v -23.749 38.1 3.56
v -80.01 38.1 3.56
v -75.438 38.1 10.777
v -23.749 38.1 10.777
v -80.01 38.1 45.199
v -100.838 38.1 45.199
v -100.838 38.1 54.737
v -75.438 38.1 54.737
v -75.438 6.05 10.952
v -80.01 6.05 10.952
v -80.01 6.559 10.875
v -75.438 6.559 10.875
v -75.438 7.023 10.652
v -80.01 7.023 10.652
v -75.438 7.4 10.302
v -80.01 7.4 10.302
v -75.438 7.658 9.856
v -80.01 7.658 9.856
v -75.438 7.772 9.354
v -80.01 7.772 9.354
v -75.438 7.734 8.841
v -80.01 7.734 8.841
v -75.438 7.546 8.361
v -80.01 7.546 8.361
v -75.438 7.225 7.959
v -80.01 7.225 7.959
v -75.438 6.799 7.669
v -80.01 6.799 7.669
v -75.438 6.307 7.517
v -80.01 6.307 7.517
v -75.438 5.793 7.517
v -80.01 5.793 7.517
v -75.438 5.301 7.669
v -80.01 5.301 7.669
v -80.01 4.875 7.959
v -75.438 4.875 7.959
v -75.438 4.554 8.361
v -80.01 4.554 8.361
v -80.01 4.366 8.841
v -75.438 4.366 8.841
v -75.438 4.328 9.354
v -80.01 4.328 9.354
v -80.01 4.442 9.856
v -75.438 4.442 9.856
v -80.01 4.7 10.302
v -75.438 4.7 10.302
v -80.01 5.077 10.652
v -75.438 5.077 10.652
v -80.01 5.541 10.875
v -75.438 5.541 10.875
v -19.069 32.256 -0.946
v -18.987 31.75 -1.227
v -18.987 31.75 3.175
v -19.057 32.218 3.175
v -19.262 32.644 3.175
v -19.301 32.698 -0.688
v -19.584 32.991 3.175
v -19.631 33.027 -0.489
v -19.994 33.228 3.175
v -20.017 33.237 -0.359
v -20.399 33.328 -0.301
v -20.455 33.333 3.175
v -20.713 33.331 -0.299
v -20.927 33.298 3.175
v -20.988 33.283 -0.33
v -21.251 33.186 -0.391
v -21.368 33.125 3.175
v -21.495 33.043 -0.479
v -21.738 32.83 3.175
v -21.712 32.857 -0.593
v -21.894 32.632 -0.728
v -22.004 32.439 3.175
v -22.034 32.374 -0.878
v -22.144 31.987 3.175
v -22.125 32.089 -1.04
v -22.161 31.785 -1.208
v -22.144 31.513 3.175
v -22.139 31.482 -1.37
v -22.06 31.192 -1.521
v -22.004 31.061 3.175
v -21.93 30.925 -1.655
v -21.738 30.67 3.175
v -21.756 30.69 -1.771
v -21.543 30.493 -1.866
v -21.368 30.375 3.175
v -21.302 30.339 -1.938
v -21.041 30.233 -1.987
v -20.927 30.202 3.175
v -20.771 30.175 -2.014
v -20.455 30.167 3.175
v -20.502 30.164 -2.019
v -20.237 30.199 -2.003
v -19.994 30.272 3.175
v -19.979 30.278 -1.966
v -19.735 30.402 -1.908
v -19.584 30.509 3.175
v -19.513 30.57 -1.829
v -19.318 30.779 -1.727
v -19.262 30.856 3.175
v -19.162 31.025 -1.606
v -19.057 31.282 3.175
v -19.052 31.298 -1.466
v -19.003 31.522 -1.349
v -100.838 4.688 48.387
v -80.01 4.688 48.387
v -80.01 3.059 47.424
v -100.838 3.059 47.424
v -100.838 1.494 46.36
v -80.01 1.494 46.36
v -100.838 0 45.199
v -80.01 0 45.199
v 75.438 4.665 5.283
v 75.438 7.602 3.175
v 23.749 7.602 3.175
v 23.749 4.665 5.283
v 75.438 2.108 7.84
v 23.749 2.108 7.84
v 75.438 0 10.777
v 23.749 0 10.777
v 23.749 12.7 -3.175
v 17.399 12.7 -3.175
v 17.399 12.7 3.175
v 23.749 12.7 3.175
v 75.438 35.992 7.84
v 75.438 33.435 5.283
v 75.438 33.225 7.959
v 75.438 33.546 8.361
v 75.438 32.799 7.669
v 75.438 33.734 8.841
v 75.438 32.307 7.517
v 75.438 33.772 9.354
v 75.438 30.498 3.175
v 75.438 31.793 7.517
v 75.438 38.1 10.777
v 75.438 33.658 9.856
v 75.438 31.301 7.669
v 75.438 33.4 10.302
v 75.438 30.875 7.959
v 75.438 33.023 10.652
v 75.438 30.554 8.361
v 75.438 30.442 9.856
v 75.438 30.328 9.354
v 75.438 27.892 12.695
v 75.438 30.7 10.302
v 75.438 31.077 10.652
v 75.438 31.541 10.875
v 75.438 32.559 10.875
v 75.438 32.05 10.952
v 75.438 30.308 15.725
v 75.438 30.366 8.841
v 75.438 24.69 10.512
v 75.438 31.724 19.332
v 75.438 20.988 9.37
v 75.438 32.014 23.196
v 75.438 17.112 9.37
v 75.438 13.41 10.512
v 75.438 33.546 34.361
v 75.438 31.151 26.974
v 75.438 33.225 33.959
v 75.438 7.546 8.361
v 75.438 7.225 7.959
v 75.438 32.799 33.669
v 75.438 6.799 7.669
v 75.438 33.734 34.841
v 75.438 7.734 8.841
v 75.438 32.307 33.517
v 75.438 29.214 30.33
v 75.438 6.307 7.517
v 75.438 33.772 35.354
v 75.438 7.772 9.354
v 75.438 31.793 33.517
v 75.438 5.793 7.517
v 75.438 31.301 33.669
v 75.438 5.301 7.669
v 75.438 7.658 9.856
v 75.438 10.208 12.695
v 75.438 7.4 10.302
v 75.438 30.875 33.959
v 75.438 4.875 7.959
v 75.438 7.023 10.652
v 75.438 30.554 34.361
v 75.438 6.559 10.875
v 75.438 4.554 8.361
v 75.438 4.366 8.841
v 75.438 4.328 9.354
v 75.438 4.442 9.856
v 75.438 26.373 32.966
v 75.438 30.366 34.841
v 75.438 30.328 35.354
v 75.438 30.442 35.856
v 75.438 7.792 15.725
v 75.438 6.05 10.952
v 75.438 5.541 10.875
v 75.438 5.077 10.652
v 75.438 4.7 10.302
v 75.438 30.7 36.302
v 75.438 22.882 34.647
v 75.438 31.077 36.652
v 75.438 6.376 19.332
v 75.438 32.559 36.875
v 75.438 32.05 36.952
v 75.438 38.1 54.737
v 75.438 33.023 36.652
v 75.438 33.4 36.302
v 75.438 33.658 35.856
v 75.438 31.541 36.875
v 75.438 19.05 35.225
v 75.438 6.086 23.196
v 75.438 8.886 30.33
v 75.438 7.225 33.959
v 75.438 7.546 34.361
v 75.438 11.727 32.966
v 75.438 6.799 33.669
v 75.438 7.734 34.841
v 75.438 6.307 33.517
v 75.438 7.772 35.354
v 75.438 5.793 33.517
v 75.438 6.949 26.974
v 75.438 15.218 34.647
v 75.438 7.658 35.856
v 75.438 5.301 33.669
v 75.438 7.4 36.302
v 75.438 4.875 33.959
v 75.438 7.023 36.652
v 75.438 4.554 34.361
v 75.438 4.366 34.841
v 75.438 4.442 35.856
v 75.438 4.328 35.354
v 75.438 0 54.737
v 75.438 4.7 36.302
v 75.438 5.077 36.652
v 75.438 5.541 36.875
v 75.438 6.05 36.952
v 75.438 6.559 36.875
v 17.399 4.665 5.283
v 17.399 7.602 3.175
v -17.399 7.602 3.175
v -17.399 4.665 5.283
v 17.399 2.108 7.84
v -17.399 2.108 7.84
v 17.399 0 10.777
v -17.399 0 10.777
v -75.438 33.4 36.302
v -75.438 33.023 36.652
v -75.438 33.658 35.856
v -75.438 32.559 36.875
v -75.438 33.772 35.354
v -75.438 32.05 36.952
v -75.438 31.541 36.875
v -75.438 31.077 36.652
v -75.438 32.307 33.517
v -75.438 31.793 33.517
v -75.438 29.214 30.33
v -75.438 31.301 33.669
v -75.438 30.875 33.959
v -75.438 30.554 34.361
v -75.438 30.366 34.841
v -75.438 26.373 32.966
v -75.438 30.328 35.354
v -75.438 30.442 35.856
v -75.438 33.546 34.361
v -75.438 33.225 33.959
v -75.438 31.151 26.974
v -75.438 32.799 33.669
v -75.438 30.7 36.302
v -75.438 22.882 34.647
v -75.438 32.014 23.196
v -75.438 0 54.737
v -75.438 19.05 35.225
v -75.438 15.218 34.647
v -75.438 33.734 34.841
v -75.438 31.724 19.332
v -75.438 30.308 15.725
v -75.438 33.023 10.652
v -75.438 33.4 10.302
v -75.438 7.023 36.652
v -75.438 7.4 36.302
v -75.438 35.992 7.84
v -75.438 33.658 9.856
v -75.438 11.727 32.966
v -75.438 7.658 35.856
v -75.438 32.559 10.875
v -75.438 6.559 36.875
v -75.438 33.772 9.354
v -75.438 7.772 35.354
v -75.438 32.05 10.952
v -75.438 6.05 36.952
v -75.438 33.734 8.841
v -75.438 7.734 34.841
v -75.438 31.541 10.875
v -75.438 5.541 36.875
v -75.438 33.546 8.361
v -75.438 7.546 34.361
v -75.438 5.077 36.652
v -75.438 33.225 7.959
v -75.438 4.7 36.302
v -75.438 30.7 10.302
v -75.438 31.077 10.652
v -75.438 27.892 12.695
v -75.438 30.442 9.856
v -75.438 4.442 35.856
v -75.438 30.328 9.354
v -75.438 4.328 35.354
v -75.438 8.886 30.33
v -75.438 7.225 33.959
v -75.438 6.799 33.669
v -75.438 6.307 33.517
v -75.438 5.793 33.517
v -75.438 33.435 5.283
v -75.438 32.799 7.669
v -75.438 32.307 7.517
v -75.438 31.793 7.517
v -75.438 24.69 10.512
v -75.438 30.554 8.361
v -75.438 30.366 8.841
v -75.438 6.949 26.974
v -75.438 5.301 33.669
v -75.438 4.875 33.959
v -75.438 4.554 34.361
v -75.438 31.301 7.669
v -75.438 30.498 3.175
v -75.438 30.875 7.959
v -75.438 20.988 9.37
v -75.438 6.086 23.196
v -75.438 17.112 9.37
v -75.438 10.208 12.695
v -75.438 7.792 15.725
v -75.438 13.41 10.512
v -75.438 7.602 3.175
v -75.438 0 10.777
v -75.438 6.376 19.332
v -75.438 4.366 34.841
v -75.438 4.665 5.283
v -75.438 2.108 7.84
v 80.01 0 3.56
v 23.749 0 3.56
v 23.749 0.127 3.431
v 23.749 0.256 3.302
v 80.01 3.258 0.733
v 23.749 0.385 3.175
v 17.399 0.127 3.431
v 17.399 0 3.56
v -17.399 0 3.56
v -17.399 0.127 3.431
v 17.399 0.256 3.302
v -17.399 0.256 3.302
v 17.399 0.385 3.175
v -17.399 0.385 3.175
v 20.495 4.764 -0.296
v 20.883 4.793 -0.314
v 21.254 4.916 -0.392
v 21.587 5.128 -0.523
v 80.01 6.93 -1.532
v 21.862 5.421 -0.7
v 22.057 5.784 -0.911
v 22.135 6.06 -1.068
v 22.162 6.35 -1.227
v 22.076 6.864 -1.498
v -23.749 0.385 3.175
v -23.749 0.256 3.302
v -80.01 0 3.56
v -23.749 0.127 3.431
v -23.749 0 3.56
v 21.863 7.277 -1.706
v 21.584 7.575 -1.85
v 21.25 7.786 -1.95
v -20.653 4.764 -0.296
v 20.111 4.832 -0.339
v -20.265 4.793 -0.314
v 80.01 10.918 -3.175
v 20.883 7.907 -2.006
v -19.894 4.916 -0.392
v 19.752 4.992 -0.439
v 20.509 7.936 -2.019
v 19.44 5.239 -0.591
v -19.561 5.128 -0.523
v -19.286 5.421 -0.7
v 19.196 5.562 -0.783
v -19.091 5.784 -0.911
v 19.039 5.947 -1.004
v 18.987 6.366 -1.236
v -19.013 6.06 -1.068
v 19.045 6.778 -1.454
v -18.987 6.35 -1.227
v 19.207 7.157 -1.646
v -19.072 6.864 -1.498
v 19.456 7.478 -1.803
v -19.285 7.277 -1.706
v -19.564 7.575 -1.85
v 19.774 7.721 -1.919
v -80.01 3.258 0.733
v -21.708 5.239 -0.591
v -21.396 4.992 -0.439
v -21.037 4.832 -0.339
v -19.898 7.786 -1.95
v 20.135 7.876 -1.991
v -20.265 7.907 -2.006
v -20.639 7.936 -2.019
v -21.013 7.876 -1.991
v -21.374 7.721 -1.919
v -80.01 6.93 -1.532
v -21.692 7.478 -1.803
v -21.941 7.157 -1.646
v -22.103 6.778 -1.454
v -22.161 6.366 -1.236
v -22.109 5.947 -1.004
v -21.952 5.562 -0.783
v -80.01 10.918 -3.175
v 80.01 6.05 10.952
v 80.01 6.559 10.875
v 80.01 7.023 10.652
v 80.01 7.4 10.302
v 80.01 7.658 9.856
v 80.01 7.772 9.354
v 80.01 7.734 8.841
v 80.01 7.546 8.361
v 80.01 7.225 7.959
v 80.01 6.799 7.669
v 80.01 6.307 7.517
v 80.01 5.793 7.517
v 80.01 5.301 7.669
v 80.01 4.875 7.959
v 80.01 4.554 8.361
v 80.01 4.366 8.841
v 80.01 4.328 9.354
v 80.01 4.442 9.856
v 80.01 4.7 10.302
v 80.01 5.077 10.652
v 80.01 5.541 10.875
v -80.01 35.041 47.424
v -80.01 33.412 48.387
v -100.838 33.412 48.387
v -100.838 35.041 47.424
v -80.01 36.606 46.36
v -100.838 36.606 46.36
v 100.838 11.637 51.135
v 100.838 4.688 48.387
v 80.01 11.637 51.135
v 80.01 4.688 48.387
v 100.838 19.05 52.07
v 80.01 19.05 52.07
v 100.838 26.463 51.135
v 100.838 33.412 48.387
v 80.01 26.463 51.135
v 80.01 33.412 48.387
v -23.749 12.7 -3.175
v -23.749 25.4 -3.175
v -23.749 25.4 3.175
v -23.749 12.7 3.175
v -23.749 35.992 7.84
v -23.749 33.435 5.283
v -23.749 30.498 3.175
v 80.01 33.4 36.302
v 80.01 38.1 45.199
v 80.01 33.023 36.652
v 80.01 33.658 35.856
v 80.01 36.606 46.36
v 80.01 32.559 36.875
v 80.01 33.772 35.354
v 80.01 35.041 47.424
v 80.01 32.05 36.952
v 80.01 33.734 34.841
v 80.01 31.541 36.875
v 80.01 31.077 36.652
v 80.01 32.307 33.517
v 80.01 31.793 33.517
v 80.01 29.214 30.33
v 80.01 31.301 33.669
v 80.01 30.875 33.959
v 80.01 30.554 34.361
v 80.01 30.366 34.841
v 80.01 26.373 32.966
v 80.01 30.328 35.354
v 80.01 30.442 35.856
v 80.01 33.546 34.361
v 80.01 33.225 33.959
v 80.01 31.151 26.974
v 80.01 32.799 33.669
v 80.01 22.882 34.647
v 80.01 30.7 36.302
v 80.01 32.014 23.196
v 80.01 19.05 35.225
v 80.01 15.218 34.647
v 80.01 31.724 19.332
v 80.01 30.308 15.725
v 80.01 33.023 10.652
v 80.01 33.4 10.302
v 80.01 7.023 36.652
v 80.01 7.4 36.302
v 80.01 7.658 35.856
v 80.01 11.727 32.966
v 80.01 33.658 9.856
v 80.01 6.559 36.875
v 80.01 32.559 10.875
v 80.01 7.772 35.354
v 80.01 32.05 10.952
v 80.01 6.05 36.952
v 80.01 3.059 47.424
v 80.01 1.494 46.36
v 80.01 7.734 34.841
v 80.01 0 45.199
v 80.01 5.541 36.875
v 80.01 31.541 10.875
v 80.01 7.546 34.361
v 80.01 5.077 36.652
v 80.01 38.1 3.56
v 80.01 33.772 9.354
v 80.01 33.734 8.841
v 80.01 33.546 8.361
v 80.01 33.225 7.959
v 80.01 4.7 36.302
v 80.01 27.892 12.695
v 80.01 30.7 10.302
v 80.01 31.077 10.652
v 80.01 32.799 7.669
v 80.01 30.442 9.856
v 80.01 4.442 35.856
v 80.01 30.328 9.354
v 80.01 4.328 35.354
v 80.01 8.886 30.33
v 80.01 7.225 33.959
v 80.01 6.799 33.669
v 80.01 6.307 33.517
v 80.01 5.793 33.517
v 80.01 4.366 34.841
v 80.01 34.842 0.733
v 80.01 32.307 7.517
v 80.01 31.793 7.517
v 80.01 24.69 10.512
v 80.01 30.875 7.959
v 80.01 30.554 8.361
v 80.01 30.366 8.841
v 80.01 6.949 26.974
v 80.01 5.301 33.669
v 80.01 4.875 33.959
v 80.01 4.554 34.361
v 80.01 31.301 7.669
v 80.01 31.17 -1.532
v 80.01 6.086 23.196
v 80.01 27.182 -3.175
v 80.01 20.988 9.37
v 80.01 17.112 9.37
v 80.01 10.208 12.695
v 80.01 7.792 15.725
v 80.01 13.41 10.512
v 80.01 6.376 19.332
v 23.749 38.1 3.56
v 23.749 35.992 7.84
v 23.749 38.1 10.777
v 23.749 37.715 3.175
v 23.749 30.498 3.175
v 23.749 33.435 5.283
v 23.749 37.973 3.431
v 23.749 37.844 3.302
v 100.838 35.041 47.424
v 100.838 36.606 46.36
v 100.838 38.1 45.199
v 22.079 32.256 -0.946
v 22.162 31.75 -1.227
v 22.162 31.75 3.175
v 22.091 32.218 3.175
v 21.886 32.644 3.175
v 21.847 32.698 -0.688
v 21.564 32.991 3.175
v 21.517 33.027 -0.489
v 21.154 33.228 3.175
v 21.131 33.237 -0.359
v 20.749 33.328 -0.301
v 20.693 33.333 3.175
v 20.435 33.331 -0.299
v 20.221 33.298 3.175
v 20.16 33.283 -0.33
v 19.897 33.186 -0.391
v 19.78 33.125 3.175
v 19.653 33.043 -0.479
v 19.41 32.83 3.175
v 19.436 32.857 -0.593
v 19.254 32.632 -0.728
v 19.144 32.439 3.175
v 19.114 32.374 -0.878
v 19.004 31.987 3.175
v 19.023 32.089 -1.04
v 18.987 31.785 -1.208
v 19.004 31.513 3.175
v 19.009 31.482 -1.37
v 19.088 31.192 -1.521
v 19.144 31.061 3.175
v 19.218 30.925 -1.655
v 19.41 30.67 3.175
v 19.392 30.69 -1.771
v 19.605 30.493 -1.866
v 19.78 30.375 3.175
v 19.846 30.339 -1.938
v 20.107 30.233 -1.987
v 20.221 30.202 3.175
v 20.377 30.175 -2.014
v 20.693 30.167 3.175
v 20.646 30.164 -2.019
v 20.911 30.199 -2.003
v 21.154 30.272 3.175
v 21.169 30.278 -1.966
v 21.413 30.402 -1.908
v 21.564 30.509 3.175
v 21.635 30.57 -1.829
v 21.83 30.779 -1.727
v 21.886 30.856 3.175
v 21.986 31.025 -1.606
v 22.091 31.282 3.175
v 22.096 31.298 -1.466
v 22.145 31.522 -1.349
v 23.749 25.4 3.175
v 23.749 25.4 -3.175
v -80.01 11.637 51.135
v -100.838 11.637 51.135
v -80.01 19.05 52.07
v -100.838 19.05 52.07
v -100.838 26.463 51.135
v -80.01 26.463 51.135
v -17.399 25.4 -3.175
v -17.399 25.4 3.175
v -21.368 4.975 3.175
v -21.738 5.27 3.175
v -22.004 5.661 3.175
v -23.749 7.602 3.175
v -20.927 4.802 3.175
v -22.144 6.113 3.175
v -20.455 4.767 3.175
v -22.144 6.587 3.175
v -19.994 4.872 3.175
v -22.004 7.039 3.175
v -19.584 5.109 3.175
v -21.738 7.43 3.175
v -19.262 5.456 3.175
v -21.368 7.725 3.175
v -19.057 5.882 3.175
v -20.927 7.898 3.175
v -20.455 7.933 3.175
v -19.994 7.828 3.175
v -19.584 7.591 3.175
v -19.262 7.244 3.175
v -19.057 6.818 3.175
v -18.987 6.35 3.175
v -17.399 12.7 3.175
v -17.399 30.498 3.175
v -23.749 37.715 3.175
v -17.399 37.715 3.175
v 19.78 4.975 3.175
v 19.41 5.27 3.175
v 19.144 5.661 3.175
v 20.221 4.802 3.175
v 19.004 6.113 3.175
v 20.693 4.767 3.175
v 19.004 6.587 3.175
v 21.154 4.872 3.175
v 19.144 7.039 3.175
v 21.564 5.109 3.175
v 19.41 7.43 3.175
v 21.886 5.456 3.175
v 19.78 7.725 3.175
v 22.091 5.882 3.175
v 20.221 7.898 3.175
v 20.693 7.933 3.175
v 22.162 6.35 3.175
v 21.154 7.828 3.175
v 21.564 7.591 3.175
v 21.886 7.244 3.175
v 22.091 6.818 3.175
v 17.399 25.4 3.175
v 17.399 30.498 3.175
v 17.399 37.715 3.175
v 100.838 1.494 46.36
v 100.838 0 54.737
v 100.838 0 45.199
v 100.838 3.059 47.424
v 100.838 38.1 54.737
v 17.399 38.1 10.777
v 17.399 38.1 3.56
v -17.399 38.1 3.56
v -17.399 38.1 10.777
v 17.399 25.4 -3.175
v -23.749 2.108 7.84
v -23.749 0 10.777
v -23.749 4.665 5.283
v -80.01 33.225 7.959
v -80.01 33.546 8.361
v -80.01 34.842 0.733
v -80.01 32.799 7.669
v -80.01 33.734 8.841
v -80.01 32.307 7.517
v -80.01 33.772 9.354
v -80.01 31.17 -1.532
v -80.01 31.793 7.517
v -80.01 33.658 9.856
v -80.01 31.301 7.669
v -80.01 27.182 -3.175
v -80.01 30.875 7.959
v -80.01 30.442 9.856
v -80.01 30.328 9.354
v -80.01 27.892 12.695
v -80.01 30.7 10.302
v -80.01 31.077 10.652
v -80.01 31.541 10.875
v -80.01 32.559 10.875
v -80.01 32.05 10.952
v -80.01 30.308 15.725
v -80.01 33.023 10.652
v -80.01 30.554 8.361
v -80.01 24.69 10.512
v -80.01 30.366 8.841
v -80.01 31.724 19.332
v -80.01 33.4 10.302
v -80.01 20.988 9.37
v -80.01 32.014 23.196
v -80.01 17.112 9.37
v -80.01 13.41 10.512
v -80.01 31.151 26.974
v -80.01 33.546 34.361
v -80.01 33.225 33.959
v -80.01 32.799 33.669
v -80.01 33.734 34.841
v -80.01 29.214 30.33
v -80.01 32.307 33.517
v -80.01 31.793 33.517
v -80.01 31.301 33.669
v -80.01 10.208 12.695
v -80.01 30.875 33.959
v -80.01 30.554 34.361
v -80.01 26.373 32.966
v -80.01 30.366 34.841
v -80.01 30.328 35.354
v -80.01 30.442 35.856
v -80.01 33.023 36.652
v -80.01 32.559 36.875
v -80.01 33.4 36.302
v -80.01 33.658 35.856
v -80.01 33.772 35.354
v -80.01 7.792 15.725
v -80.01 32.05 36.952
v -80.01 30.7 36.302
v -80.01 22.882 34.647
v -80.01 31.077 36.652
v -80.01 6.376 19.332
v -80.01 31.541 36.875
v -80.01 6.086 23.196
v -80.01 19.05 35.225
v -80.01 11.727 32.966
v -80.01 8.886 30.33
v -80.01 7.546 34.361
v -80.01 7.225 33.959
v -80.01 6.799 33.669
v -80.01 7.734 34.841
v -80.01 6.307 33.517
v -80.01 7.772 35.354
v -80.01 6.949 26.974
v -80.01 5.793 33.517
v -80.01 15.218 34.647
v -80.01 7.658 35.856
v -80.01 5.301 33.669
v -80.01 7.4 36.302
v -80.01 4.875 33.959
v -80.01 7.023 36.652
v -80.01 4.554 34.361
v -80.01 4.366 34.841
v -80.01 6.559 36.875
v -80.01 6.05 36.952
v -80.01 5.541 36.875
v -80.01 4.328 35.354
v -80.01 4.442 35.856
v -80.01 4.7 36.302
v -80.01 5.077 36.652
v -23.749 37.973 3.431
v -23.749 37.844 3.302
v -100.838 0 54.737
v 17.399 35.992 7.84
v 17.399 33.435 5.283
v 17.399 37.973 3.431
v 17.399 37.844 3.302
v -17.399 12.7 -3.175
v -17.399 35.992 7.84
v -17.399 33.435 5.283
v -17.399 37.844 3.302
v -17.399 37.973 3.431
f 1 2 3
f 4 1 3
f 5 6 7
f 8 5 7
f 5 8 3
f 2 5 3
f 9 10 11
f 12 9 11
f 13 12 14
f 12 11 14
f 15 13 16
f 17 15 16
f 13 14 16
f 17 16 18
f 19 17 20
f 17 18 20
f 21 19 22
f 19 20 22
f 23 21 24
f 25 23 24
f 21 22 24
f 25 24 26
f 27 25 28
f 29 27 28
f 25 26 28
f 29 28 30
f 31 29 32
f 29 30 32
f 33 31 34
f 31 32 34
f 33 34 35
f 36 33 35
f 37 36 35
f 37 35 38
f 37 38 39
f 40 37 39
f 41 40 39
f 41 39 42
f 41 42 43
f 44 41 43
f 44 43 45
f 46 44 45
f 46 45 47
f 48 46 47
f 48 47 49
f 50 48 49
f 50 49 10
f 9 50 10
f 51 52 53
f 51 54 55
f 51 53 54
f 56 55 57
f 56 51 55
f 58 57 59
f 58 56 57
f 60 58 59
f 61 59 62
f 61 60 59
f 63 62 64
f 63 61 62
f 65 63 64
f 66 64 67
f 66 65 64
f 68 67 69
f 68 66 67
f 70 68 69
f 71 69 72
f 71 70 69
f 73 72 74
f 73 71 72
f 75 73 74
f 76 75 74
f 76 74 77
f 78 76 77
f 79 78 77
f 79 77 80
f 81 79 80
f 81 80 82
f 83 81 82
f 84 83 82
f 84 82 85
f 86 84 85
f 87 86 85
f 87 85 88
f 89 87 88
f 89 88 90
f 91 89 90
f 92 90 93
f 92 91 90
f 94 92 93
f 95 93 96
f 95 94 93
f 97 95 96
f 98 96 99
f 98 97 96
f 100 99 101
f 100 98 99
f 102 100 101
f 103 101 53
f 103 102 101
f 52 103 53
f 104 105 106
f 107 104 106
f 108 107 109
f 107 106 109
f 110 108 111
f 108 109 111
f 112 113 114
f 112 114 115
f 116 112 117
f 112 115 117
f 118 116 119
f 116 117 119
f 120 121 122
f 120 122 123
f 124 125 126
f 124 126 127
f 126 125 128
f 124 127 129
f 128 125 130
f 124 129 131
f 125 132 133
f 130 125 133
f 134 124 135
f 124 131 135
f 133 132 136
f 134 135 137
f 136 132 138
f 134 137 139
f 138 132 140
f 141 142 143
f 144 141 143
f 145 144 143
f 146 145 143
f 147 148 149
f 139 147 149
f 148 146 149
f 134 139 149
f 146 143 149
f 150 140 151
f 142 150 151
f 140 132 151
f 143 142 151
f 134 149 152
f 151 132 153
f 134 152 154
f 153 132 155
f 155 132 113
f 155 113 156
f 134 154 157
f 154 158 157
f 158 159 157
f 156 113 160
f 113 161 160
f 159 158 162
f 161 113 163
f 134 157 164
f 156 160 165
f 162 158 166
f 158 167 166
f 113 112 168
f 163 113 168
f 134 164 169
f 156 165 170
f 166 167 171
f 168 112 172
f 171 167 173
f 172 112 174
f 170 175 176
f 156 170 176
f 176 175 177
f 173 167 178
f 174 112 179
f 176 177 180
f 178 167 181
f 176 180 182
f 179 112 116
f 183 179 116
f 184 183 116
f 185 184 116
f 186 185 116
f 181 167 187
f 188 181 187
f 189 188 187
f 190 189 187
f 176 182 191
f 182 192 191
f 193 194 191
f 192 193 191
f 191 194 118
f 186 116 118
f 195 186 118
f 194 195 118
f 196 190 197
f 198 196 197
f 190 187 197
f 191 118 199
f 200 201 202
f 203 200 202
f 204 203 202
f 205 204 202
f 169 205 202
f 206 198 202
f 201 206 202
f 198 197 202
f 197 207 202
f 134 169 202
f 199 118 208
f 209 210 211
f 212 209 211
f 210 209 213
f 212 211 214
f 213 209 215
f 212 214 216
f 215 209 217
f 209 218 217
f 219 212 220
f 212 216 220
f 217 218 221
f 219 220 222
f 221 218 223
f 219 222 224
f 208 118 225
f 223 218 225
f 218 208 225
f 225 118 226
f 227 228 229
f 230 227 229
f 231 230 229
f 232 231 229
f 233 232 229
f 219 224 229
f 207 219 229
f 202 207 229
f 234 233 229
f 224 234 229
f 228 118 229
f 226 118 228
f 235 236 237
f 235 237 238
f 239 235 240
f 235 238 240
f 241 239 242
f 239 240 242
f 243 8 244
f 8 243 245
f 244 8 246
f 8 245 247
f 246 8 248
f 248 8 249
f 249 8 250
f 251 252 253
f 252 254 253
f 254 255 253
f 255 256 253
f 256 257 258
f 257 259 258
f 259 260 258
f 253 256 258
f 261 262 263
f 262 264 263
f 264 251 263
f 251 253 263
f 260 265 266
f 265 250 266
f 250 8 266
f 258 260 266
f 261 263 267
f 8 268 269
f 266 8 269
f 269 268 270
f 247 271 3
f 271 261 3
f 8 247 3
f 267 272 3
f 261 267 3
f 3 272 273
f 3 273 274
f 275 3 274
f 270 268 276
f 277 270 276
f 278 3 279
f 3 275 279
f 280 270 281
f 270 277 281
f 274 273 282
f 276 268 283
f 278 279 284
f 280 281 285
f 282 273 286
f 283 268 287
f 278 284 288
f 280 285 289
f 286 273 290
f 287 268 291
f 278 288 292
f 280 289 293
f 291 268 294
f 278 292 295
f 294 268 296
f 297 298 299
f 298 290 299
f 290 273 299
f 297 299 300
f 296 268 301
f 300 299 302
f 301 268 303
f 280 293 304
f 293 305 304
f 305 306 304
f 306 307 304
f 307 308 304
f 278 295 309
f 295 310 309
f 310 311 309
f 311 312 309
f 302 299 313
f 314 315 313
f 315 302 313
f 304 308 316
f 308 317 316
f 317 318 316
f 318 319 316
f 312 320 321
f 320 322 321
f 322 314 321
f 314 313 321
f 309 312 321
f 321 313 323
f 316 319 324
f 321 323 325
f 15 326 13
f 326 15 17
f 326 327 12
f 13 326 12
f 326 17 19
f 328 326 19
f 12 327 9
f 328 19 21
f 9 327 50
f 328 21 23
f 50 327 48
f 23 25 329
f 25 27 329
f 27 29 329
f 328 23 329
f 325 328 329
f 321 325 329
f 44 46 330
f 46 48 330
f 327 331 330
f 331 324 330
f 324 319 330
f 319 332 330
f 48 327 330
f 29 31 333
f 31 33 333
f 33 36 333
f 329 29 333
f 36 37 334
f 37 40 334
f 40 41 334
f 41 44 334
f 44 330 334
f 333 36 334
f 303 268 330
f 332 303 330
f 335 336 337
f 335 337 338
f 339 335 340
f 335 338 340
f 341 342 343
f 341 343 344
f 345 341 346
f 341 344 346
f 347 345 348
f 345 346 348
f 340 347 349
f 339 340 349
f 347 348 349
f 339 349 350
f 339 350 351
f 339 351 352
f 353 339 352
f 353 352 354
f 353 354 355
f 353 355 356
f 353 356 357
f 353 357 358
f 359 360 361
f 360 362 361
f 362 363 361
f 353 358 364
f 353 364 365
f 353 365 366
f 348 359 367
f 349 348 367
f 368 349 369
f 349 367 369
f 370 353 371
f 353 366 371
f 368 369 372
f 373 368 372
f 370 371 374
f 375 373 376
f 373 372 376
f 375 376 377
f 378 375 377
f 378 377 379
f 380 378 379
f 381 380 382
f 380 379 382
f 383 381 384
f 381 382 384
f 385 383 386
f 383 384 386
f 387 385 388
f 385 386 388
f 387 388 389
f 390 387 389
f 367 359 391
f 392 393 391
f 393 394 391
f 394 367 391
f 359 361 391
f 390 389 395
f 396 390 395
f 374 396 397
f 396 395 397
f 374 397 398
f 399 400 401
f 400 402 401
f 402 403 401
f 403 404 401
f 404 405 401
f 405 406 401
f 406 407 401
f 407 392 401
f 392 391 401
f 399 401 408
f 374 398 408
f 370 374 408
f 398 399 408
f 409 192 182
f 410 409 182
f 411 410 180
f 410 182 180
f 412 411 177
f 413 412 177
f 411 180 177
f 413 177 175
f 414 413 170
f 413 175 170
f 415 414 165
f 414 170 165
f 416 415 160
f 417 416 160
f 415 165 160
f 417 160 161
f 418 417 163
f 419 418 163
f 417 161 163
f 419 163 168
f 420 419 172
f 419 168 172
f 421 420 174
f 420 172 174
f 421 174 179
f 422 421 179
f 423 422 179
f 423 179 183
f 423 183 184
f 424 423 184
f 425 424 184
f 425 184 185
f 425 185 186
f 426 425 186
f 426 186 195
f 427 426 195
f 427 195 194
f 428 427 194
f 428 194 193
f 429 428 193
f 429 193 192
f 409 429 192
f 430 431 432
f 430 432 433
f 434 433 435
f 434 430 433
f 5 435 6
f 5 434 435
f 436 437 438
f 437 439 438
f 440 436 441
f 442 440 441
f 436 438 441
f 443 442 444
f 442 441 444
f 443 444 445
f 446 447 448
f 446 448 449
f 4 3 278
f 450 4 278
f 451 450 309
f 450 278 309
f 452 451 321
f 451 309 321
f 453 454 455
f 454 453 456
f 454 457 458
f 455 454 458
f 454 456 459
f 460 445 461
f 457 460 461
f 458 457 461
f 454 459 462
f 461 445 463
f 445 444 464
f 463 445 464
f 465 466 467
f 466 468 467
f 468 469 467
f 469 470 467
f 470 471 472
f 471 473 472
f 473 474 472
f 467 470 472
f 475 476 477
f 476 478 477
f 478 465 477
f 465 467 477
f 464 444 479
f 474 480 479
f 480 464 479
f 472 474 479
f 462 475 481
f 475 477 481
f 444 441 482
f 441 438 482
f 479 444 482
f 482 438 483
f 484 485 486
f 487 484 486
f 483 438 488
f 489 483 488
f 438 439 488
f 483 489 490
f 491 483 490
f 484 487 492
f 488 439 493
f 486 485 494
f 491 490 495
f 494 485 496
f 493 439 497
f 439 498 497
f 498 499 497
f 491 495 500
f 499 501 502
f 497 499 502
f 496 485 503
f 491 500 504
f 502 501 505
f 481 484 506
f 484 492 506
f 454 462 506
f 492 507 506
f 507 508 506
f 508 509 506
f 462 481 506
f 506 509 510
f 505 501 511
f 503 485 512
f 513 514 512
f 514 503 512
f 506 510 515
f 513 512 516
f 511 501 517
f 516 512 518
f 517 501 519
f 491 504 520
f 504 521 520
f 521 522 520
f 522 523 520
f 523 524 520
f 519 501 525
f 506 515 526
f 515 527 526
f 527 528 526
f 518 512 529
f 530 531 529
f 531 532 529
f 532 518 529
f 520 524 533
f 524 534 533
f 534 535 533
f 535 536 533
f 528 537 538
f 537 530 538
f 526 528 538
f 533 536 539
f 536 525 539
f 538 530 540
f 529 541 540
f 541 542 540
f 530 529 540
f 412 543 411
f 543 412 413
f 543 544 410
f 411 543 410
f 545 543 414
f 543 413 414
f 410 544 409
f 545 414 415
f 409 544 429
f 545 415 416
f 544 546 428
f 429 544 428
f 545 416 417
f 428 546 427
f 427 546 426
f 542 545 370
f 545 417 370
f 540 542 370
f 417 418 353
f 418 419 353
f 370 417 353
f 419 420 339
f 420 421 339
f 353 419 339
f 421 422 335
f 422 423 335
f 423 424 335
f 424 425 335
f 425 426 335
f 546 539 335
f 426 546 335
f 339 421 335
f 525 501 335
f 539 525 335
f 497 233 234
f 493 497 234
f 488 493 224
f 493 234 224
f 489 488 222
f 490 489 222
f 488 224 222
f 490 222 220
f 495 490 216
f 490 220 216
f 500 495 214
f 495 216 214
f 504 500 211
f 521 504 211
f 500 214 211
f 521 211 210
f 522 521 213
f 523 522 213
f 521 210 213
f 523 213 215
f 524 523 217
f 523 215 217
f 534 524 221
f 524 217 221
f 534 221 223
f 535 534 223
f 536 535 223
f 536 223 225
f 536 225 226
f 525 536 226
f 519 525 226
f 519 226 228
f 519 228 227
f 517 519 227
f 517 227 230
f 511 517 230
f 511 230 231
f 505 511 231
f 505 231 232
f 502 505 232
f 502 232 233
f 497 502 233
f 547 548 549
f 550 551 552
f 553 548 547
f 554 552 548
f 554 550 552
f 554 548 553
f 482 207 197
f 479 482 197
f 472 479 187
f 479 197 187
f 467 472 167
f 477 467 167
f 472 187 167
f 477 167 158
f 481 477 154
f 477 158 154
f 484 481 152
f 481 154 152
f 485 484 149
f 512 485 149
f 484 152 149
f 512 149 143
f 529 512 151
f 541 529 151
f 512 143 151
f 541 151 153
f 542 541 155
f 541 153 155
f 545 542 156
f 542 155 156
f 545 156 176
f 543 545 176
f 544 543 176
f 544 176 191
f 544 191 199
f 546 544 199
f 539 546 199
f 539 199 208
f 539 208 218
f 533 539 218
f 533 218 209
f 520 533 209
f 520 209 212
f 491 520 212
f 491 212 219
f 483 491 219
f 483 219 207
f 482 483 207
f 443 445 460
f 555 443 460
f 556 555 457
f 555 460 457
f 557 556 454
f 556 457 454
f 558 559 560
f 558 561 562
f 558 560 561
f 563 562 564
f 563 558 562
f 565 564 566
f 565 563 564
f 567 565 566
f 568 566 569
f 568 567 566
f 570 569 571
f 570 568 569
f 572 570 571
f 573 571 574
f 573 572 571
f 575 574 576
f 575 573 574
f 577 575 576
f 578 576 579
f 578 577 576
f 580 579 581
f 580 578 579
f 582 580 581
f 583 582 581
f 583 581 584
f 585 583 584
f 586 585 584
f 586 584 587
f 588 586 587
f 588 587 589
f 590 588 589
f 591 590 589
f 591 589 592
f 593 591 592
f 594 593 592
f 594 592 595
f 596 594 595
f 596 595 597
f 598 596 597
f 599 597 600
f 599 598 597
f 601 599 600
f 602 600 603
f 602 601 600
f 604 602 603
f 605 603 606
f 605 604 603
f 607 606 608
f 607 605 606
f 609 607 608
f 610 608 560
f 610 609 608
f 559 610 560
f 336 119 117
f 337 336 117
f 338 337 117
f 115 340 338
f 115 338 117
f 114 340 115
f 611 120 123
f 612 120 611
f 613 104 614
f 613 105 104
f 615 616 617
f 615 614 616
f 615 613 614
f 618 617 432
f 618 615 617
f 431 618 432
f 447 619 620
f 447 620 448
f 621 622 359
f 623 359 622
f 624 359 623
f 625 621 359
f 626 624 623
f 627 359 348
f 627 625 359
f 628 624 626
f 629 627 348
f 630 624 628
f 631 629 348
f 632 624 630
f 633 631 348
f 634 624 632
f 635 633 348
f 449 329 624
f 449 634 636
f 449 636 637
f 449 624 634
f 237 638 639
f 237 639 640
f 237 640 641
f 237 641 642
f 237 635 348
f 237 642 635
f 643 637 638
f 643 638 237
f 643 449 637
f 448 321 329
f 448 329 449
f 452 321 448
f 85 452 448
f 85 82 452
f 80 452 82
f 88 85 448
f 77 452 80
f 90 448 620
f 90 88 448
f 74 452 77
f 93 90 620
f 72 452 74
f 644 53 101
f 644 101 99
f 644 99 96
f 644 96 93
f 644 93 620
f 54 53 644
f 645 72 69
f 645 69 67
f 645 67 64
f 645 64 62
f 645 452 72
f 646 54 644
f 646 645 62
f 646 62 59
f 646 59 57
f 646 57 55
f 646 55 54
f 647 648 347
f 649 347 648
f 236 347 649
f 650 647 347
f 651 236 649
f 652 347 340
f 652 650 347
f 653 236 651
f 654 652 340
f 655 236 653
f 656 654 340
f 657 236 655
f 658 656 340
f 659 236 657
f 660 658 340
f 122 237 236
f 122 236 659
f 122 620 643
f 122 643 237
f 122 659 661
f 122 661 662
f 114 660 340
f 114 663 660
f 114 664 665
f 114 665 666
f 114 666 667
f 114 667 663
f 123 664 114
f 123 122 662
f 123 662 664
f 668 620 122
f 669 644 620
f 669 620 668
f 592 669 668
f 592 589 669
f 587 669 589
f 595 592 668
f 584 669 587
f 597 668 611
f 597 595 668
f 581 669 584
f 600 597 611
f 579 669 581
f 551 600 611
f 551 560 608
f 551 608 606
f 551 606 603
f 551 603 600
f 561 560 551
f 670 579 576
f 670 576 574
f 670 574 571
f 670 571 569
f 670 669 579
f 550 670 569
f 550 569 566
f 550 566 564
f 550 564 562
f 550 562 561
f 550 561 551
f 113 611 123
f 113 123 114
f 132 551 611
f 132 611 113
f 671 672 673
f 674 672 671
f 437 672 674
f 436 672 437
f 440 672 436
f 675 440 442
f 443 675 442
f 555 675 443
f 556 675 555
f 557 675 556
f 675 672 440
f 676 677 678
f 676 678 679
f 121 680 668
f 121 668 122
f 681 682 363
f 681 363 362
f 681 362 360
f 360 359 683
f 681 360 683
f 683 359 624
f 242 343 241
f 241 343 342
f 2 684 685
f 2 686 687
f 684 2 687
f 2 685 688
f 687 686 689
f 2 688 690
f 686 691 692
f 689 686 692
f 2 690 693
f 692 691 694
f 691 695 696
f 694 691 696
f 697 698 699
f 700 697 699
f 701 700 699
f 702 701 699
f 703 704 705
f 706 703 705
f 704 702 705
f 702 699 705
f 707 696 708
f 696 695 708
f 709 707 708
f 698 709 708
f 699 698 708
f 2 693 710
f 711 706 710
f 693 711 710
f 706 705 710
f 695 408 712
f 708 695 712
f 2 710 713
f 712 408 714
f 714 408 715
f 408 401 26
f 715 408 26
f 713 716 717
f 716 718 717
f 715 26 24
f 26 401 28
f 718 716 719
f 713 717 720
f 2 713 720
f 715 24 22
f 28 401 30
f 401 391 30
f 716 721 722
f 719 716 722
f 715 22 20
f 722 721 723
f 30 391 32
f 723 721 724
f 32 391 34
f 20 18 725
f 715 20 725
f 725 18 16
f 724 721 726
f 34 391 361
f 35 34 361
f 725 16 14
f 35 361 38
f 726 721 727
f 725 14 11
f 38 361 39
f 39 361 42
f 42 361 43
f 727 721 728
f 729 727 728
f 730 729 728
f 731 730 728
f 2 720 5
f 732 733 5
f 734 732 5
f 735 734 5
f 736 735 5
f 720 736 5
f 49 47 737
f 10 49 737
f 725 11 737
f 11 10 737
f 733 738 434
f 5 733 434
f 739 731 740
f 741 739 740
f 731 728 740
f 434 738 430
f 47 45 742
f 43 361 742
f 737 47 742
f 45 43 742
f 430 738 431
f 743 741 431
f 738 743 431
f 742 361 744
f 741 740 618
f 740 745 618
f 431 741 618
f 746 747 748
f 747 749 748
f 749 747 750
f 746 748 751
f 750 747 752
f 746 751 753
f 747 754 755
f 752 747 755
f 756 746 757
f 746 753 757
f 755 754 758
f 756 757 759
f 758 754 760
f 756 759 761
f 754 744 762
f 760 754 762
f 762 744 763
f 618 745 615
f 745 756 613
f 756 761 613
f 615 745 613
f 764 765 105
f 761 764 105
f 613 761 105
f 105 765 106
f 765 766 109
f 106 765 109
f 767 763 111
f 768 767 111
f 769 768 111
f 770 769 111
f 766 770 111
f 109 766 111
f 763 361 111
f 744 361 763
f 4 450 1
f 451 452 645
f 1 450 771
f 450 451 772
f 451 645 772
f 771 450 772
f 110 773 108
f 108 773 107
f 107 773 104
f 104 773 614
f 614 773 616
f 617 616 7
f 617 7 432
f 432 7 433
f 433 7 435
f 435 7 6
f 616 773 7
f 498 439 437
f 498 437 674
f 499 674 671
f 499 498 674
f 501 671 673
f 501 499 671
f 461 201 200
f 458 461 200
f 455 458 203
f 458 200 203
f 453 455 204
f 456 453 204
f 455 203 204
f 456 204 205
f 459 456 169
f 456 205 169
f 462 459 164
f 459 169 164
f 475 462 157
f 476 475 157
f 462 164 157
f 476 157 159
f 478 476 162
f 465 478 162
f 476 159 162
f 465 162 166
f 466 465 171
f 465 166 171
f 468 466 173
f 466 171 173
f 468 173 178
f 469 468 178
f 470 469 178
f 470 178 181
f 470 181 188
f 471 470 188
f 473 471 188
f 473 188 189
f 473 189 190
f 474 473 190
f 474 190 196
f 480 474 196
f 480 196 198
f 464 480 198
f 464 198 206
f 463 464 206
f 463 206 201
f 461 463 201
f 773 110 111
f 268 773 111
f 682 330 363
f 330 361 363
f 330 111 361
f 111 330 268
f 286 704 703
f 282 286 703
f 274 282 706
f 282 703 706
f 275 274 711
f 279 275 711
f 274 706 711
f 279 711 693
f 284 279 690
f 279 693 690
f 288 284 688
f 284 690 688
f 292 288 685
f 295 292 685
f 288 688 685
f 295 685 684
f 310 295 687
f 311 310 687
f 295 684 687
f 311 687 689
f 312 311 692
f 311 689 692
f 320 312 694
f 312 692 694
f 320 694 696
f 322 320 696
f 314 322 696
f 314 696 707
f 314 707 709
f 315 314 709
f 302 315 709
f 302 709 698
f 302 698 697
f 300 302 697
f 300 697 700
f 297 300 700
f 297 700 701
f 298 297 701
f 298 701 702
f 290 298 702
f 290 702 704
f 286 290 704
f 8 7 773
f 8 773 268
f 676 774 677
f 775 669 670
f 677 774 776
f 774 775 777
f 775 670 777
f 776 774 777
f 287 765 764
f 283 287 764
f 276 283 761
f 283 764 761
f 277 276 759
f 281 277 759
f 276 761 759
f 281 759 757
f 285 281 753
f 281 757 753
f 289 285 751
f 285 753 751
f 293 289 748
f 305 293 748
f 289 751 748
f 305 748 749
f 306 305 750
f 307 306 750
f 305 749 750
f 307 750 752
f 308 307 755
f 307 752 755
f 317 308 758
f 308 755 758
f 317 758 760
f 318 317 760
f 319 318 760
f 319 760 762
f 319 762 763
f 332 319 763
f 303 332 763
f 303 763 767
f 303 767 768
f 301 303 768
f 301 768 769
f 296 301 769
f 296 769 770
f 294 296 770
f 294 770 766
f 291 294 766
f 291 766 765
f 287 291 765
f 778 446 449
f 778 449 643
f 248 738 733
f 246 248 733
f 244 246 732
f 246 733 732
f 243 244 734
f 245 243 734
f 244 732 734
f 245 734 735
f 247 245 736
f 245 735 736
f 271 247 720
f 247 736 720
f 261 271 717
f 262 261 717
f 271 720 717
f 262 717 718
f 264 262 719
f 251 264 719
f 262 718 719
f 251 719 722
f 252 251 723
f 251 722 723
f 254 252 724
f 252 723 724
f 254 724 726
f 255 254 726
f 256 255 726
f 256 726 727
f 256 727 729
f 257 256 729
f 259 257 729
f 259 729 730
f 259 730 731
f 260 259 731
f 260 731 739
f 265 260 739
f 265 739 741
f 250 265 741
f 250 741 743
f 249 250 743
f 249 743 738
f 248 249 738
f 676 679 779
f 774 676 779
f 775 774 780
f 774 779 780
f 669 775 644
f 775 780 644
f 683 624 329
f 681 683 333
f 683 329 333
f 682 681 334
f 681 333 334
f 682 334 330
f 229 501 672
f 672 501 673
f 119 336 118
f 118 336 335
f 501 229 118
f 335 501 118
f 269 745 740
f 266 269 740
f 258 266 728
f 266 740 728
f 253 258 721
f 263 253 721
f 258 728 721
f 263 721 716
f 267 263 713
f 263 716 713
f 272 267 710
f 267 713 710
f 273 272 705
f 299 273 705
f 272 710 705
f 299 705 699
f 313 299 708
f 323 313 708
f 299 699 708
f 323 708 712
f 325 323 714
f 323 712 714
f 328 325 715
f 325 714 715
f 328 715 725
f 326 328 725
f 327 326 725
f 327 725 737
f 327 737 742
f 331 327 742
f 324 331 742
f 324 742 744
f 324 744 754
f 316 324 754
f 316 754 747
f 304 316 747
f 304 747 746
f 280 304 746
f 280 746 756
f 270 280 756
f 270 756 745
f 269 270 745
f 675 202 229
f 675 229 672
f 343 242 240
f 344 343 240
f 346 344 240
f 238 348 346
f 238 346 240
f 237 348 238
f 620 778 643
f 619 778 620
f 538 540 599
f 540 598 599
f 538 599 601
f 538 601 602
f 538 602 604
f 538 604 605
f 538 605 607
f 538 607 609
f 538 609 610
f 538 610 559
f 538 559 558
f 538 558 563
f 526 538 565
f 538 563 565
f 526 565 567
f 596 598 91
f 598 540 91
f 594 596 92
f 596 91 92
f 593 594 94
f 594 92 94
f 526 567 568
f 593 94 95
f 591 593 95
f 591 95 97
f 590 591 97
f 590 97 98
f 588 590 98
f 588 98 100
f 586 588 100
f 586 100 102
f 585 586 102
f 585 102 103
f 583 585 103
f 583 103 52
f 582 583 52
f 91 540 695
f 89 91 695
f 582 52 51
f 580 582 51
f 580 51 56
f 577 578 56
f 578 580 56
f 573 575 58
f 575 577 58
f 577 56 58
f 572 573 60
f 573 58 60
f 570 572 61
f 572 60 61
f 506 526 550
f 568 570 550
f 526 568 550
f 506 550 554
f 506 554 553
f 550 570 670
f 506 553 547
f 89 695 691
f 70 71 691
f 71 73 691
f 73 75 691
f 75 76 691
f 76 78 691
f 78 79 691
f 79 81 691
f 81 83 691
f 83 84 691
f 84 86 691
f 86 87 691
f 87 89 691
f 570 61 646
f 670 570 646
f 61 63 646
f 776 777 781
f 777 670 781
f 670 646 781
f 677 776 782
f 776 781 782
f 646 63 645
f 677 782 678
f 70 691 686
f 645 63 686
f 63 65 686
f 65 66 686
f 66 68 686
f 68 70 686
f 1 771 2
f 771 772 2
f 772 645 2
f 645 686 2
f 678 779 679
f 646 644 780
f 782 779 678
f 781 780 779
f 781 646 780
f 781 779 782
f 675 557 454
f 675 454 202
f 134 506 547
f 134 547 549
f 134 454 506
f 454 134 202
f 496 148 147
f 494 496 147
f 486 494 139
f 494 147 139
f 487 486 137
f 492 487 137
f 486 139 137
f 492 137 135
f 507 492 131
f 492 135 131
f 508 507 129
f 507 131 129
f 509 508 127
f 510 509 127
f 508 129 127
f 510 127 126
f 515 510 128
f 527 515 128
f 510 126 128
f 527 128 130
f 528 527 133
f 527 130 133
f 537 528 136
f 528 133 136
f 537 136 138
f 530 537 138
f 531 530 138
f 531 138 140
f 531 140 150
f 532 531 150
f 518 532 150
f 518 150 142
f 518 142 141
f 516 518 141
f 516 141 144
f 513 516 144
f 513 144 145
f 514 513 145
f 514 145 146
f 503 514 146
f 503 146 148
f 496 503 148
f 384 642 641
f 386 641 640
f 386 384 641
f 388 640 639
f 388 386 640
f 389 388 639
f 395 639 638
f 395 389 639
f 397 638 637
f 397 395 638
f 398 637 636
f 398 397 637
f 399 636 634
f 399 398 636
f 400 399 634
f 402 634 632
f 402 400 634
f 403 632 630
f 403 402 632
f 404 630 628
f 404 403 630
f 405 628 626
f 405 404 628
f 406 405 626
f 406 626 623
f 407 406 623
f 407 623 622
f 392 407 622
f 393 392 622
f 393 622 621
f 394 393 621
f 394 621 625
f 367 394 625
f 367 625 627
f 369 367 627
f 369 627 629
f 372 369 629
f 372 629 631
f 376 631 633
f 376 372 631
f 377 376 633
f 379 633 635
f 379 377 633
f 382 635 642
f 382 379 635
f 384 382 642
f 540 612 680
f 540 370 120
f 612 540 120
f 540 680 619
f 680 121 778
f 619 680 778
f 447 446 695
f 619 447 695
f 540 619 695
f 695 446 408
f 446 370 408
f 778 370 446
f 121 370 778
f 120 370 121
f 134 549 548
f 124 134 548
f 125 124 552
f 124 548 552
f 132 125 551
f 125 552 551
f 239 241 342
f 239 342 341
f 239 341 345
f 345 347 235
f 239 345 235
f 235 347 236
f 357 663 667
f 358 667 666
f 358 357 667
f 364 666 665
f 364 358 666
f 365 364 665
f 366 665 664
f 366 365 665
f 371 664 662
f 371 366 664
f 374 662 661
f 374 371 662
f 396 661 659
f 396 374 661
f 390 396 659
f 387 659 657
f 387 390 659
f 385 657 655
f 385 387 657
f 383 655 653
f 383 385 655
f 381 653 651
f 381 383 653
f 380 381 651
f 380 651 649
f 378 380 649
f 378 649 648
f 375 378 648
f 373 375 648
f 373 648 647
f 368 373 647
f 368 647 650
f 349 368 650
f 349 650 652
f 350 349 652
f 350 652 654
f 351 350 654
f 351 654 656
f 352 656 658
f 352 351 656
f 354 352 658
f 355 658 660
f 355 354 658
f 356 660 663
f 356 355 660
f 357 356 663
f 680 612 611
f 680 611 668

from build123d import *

# Parameters (mm, degrees)
SKETCH3_W               = 20.828
SKETCH3_H               = 6.35
SKETCH3_W_2             = 4.572
SKETCH3_H_2             = 45.212
SKETCH3_W_3             = 150.876
BOSS_EXTRUDE1_DEPTH     = 38.1
SKETCH5_R               = 1.7272
SKETCH5_R_2             = 13
CUT_EXTRUDE2_DEPTH      = 193.753075911
CUT_EXTRUDE3_DEPTH      = 193.753075911
BOSS_EXTRUDE2_DEPTH     = 155.448
CUT_EXTRUDE1_DEPTH      = 120.492895555
CUT_EXTRUDE1_DEPTH_BACK = 120.492895555
SKETCH4_R               = 1.5875
SKETCH8_R               = 29.845
CUT_EXTRUDE4_DEPTH      = 193.75307593
BOSS_EXTRUDE3_DEPTH     = 20.828
SKETCH10_W              = 6.35
SKETCH10_H              = 38.1
CUT_EXTRUDE5_DEPTH      = 120.492895586


with BuildPart() as part:
    # Sketch3 → Boss-Extrude1 (new body)
    with BuildSketch(Plane(origin=(0, 0, 0), x_dir=(1, 0, 0), z_dir=(0, 1, 0))):
        with Locations((-90.424, -51.562)):
            Rectangle(SKETCH3_W, SKETCH3_H)
        with Locations((-77.724, -51.562)):
            Rectangle(SKETCH3_W_2, SKETCH3_H)
        with Locations((-77.724, -25.781)):
            Rectangle(SKETCH3_W_2, SKETCH3_H_2)
        with Locations((-77.724, 0)):
            Rectangle(SKETCH3_W_2, SKETCH3_H)
        Rectangle(SKETCH3_W_3, SKETCH3_H)
        with Locations((77.724, 0)):
            Rectangle(SKETCH3_W_2, SKETCH3_H)
        with Locations((77.724, -25.781)):
            Rectangle(SKETCH3_W_2, SKETCH3_H_2)
        with Locations((77.724, -51.562)):
            Rectangle(SKETCH3_W_2, SKETCH3_H)
        with Locations((90.424, -51.562)):
            Rectangle(SKETCH3_W, SKETCH3_H)
    extrude(amount=BOSS_EXTRUDE1_DEPTH)

    # Sketch5 → Cut-Extrude2 (cut, through all)
    with BuildSketch(Plane.ZY.offset(80.01)):
        with Locations((9.225, 32.05)):
            Circle(SKETCH5_R)
        with Locations((35.225, 32.05)):
            Circle(SKETCH5_R)
        with Locations((35.225, 6.05)):
            Circle(SKETCH5_R)
        with Locations((9.225, 6.05)):
            Circle(SKETCH5_R)
        with Locations((22.225, 19.05)):
            Circle(SKETCH5_R_2)
    extrude(amount=-CUT_EXTRUDE2_DEPTH, mode=Mode.SUBTRACT)

    # Sketch6 → Cut-Extrude3 (cut, through all)
    with BuildSketch(Plane.ZY.offset(80.01)):
        with BuildLine():
            Line((22.225, 45.72), (-24.944215418, 45.72))
            Line((-24.944215418, 45.72), (-24.944215418, -7.62))
            Line((-24.944215418, -7.62), (22.225, -7.62))
            ThreePointArc((22.225, -7.62), (-4.445, 19.05), (22.225, 45.72))
        make_face()
    extrude(amount=-CUT_EXTRUDE3_DEPTH, mode=Mode.SUBTRACT)

    # Sketch7 → Boss-Extrude2 (add)
    with BuildSketch(Plane.ZY.offset(80.01)):
        with BuildLine():
            Line((3.55988816, 38.1), (10.7773747, 38.1))
            ThreePointArc((10.7773747, 38.1), (0, 19.05), (10.7773747, 0))
            Line((10.7773747, 0), (3.55988816, 0))
            ThreePointArc((3.55988816, 0), (-0.473774796, 5.048052894), (-3.175, 10.918032218))
            Line((-3.175, 10.918032218), (-3.175, 27.181967782))
            ThreePointArc((-3.175, 27.181967782), (-0.473774796, 33.051947106), (3.55988816, 38.1))
        make_face()
    extrude(amount=-BOSS_EXTRUDE2_DEPTH)

    # Sketch4 → Cut-Extrude1 (cut, two sides: drawn at the far end of the back side and taken through both)
    with BuildSketch(Plane.XY.offset(3.175).offset(-CUT_EXTRUDE1_DEPTH_BACK)):
        Polygon((17.399, 25.4), (17.399, 19.05), (17.399, 12.7), (23.749, 12.7), (23.749, 25.4), align=None)
        Polygon((-17.399, 25.4), (-23.749, 25.4), (-23.749, 12.7), (-17.399, 12.7), (-17.399, 19.05), align=None)
        with Locations((-20.574, 31.75)):
            Circle(SKETCH4_R)
        with Locations((-20.574, 6.35)):
            Circle(SKETCH4_R)
        with Locations((20.574, 6.35)):
            Circle(SKETCH4_R)
        with Locations((20.574, 31.75)):
            Circle(SKETCH4_R)
    extrude(amount=CUT_EXTRUDE1_DEPTH + CUT_EXTRUDE1_DEPTH_BACK, mode=Mode.SUBTRACT)

    # Sketch8 → Cut-Extrude4 (cut, through all)
    with BuildSketch(Plane.ZY.offset(80.01)):
        with Locations((22.225, 19.05)):
            Circle(SKETCH8_R)
    cut_extrude4 = extrude(amount=CUT_EXTRUDE4_DEPTH, mode=Mode.SUBTRACT)

    # Sketch9 → Boss-Extrude3 (add)
    with BuildSketch(Plane.ZY.offset(80.01)):
        with BuildLine():
            Line((48.387, 38.1), (48.387, 33.412234541))
            ThreePointArc((48.387, 33.412234541), (46.904737017, 35.831972642), (45.199366694, 38.1))
            Line((45.199366694, 38.1), (48.387, 38.1))
        make_face()
        with BuildLine():
            Line((48.387, 0), (48.387, 4.687765459))
            ThreePointArc((48.387, 4.687765459), (46.904737017, 2.268027358), (45.199366694, 0))
            Line((45.199366694, 0), (48.387, 0))
        make_face()
    boss_extrude3 = extrude(amount=BOSS_EXTRUDE3_DEPTH)

    # Mirror4: Cut-Extrude4, Boss-Extrude3 across plane
    add(cut_extrude4.mirror(Plane(origin=(0, 0, 0), x_dir=(0, 0, 1), z_dir=(1, 0, 0))), mode=Mode.SUBTRACT)
    add(boss_extrude3.mirror(Plane(origin=(0, 0, 0), x_dir=(0, 0, 1), z_dir=(1, 0, 0))))

    # Sketch10 → Cut-Extrude5 (cut, through all)
    with BuildSketch(Plane.XY.offset(3.175)):
        with Locations((-20.574, 19.05)):
            Rectangle(SKETCH10_W, SKETCH10_H)
        with Locations((20.574, 19.05)):
            Rectangle(SKETCH10_W, SKETCH10_H)
    extrude(amount=CUT_EXTRUDE5_DEPTH, mode=Mode.SUBTRACT)


solid = part.part
